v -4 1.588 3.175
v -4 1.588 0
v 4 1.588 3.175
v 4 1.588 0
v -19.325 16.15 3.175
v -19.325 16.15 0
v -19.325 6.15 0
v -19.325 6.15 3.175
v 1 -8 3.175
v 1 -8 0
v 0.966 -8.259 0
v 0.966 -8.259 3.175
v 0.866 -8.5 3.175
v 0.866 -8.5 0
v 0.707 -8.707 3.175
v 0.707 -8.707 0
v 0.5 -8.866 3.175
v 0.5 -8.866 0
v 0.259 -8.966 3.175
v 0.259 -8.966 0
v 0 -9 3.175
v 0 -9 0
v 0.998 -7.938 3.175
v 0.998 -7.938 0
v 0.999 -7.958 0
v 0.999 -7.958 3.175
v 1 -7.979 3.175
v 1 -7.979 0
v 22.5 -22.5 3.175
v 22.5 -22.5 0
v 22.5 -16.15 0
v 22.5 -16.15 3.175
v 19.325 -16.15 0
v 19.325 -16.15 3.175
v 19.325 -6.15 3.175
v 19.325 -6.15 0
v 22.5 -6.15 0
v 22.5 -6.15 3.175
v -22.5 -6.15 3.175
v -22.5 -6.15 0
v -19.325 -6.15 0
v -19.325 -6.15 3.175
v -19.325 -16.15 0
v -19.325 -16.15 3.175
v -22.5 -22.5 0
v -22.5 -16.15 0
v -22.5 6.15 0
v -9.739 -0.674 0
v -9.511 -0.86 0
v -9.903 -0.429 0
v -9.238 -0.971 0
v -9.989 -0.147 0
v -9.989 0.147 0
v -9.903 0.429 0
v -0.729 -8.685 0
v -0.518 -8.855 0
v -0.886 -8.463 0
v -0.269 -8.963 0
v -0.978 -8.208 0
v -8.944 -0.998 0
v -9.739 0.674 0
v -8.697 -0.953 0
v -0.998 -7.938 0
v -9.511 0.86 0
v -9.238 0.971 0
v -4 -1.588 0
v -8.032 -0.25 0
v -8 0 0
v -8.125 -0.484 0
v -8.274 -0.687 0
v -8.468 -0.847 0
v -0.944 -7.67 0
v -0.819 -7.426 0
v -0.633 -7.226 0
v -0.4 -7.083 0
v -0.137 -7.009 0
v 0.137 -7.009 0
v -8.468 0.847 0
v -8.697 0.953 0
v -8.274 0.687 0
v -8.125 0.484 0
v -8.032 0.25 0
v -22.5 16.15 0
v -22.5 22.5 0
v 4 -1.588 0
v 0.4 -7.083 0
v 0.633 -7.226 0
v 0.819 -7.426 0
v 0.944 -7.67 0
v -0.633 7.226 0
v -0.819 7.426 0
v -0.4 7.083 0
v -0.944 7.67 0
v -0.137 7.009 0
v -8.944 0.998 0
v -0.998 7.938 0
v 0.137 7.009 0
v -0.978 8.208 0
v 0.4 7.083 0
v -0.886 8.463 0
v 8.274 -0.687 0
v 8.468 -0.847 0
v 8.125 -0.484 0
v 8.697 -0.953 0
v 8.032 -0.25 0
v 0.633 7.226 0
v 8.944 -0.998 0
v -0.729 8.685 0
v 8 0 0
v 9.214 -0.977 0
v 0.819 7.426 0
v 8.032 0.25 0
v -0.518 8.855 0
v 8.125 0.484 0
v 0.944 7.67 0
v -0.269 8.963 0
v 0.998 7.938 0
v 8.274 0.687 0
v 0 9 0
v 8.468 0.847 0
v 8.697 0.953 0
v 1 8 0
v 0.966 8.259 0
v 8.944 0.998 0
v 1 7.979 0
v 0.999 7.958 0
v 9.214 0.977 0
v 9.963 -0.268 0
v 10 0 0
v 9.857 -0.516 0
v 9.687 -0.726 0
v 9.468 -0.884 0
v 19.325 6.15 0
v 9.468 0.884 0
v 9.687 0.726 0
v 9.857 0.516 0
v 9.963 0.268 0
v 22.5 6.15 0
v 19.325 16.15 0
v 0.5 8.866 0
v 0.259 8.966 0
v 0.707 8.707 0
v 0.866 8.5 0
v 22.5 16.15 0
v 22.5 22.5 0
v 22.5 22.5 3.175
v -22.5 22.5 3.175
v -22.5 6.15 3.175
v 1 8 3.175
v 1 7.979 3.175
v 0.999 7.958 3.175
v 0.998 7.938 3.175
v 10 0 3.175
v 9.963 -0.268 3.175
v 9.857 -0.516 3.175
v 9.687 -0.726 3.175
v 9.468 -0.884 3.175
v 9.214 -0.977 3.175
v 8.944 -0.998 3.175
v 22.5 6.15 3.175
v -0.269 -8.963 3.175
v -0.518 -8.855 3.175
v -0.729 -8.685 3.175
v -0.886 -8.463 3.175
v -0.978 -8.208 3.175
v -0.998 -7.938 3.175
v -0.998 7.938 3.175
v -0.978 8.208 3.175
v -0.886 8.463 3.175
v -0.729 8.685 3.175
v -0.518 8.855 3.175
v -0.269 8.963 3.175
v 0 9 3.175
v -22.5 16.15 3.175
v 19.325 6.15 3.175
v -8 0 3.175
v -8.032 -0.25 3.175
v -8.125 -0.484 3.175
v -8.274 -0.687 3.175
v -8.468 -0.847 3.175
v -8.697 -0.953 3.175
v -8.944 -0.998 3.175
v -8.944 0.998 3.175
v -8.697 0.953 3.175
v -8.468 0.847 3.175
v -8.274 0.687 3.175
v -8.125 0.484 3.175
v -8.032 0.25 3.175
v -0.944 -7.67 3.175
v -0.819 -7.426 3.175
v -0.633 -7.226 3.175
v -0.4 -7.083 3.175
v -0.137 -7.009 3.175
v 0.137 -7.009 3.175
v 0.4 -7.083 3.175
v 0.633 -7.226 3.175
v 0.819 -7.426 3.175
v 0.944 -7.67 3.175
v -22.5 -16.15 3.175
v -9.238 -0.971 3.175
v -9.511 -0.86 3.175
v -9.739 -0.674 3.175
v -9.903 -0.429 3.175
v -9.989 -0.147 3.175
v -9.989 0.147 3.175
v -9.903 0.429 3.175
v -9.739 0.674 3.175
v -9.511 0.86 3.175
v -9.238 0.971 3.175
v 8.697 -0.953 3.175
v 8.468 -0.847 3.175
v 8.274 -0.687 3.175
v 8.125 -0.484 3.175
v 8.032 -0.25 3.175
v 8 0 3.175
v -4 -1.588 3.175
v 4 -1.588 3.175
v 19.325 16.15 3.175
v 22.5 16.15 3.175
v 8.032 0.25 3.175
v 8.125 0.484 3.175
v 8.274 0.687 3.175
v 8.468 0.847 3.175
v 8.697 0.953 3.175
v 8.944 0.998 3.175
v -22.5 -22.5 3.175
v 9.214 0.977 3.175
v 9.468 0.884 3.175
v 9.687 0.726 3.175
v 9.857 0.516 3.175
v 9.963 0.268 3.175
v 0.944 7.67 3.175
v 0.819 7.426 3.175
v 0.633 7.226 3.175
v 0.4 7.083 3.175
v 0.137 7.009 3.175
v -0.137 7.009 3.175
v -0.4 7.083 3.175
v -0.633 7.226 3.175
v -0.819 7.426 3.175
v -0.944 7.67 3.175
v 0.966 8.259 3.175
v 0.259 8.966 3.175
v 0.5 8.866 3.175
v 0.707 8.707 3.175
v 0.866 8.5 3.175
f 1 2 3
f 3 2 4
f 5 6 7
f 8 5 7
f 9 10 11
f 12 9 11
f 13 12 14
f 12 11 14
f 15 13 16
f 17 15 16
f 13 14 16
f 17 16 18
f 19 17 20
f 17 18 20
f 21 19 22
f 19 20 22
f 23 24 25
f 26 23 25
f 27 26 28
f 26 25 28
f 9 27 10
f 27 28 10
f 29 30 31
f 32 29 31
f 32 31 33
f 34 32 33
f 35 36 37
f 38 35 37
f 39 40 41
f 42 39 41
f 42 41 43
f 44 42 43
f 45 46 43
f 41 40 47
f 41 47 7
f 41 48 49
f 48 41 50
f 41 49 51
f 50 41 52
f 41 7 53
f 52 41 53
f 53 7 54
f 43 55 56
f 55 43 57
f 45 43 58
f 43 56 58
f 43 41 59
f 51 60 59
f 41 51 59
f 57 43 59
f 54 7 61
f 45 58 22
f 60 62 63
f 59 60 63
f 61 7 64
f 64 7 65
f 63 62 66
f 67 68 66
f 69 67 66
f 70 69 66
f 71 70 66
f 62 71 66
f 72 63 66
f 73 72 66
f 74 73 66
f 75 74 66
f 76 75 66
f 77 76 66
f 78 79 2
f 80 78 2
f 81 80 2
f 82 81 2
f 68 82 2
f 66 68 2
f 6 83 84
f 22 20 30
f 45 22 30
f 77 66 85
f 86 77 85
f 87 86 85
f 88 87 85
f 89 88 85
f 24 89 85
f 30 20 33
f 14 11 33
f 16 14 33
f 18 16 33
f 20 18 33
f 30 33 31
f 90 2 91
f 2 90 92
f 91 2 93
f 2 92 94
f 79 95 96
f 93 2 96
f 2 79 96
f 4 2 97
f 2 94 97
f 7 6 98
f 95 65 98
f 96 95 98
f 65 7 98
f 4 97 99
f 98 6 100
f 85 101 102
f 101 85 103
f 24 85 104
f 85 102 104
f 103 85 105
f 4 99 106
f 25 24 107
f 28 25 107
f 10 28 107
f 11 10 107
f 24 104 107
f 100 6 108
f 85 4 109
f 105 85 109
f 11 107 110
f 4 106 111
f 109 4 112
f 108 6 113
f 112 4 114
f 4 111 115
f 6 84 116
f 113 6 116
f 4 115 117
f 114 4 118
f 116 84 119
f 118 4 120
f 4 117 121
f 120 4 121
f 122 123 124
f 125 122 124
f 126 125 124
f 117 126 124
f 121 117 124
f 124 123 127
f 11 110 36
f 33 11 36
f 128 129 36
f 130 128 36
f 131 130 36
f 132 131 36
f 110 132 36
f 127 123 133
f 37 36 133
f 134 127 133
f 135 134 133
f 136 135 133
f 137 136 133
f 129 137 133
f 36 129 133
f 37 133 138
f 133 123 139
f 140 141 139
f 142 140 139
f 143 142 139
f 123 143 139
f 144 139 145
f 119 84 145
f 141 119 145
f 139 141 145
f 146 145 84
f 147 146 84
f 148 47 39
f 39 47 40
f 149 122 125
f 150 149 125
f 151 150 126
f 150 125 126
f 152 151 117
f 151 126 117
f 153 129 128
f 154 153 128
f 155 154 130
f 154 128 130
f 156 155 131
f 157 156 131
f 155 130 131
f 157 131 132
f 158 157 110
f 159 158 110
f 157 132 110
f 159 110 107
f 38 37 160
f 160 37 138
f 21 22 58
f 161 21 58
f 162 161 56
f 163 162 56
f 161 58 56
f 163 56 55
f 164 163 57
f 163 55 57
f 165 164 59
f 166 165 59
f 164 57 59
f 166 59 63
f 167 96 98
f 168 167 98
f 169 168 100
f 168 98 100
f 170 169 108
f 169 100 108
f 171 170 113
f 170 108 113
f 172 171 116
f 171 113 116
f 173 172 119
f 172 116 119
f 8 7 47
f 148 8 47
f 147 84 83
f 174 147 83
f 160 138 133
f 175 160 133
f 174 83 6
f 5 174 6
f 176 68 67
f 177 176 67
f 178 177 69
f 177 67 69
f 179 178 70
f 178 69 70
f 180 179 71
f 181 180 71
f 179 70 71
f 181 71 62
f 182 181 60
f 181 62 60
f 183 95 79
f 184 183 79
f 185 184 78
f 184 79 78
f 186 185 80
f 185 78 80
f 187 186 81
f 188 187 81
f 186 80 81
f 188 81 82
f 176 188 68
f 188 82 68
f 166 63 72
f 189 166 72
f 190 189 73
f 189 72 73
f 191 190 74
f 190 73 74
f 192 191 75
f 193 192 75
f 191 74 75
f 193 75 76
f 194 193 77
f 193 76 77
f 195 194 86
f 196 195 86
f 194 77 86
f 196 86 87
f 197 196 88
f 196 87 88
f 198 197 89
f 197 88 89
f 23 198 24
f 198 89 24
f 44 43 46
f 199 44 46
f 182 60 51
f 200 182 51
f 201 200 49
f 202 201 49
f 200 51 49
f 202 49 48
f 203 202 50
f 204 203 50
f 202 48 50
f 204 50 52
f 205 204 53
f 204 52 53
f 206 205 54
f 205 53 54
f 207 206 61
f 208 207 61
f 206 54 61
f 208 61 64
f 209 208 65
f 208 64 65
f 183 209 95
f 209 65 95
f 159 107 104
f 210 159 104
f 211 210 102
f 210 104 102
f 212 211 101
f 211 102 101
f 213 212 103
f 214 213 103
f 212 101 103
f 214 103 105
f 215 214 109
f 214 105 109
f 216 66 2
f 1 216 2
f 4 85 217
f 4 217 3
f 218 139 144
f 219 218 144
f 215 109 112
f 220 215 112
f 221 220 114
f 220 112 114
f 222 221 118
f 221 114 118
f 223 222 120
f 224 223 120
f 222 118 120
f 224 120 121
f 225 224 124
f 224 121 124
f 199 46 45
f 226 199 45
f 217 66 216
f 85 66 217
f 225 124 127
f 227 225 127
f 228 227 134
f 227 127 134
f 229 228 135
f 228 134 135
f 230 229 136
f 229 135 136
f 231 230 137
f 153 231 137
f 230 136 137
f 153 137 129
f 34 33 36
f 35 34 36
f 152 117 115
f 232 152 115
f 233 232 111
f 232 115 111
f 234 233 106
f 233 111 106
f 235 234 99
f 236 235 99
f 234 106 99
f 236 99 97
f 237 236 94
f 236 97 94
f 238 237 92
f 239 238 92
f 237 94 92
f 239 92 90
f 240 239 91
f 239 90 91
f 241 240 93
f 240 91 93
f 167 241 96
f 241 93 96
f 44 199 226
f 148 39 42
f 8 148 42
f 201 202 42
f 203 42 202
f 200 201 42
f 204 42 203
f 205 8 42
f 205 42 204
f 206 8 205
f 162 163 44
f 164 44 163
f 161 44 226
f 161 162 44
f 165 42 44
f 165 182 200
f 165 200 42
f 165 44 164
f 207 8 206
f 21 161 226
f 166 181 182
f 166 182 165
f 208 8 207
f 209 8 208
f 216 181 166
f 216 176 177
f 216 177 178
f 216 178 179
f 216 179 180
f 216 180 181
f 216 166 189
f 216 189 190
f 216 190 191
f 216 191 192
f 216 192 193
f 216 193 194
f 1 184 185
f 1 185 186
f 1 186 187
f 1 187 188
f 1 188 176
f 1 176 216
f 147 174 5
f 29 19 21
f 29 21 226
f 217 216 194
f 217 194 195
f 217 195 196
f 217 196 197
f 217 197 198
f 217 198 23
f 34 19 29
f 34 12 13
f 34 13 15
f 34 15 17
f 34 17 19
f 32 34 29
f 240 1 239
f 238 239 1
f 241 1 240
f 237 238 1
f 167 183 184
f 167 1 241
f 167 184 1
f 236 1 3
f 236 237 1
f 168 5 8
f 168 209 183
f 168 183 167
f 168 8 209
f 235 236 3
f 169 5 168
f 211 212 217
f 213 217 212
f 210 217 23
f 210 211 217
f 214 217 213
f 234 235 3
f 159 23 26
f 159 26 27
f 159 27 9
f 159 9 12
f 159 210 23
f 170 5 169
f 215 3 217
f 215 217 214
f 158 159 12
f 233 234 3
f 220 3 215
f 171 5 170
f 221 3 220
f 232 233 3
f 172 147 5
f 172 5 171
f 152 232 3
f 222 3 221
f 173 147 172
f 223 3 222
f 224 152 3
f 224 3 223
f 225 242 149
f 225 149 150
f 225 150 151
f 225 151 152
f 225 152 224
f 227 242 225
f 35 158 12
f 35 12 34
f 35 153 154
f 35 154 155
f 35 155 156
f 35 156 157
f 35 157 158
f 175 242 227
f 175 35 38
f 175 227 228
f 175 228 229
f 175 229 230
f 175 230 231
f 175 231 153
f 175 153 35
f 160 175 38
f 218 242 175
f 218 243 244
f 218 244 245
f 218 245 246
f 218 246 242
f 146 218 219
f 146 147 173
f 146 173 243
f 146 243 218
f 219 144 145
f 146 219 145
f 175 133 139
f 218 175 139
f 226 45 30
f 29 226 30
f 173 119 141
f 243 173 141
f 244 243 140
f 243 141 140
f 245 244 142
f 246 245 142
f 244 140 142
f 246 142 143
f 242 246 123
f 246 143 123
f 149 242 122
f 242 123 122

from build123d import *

# Parameters (mm, degrees)
F0_W     = 8
F0_H     = 3.175
F1_DEPTH = 3.175


# Not quite as in the source:
# - a length typed as a fraction of an inch, garbled in the dataset ("3 / 203.2 mm" for 3/8 in), is restored
# - a feature names something its author has since deleted; it is built from what else it names


with BuildPart() as f1:
    # F0 (on Top) → F1 (new body)
    with BuildSketch(Plane.XY):
        Polygon((-19.325, 11.15), (19.325, 11.15), (19.325, 16.15), (22.5, 16.15), (22.5, 22.5), (-22.5, 22.5), (-22.5, 16.15), (-19.325, 16.15), align=None)
        Polygon((-19.325, -11.15), (19.325, -11.15), (19.325, -6.15), (22.5, -6.15), (22.5, 6.15), (19.325, 6.15), (19.325, 11.15), (-19.325, 11.15), (-19.325, 6.15), (-22.5, 6.15), (-22.5, -6.15), (-19.325, -6.15), align=None)
        with BuildLine():
            ThreePointArc((-8.9444444444, -0.9984555975), (-10, 0), (-8.9444444444, 0.9984555975))
            ThreePointArc((-8.9444444444, 0.9984555975), (-6.000579123, 6.7076859042), (0, 9))
            ThreePointArc((0, 9), (6.000579123, 6.7076859042), (8.9444444444, 0.9984555975))
            ThreePointArc((8.9444444444, 0.9984555975), (9.6871842709, 0.7264831573), (10, 0))
            ThreePointArc((10, 0), (9.6871842709, -0.7264831573), (8.9444444444, -0.9984555975))
            ThreePointArc((8.9444444444, -0.9984555975), (6.000579123, -6.7076859042), (0, -9))
            ThreePointArc((0, -9), (-6.000579123, -6.7076859042), (-8.9444444444, -0.9984555975))
        make_face(mode=Mode.SUBTRACT)
        Polygon((-22.5, -22.5), (22.5, -22.5), (22.5, -16.15), (19.325, -16.15), (19.325, -11.15), (-19.325, -11.15), (-19.325, -16.15), (-22.5, -16.15), align=None)
        with BuildLine():
            ThreePointArc((-0.9980449639, 7.9375), (-5.9993482859, 5.2922415047), (-8, 0))
            ThreePointArc((-8, 0), (-5.9993482859, -5.2922415047), (-0.9980449639, -7.9375))
            ThreePointArc((-0.9980449639, -7.9375), (0, -7), (0.9980449639, -7.9375))
            ThreePointArc((0.9980449639, -7.9375), (5.9993482859, -5.2922415047), (8, 0))
            ThreePointArc((8, 0), (5.9993482859, 5.2922415047), (0.9980449639, 7.9375))
            ThreePointArc((0.9980449639, 7.9375), (0, 7), (-0.9980449639, 7.9375))
        make_face()
        Rectangle(F0_W, F0_H, mode=Mode.SUBTRACT)
        with BuildLine():
            ThreePointArc((-8.9444444444, 0.9984555975), (-8.2735168427, 0.6871842709), (-8, 0))
            ThreePointArc((-8, 0), (-5.9993482859, 5.2922415047), (-0.9980449639, 7.9375))
            ThreePointArc((-0.9980449639, 7.9375), (-0.7288689869, 8.6846531969), (0, 9))
            ThreePointArc((0, 9), (-6.000579123, 6.7076859042), (-8.9444444444, 0.9984555975))
        make_face()
        with BuildLine():
            ThreePointArc((8.9444444444, 0.9984555975), (6.000579123, 6.7076859042), (0, 9))
            ThreePointArc((0, 9), (0.7071067812, 8.7071067812), (1, 8))
            ThreePointArc((1, 8), (0.9995111215, 7.9687347151), (0.9980449639, 7.9375))
            ThreePointArc((0.9980449639, 7.9375), (5.9993482859, 5.2922415047), (8, 0))
            ThreePointArc((8, 0), (8.2735168427, 0.6871842709), (8.9444444444, 0.9984555975))
        make_face()
        with BuildLine():
            ThreePointArc((1, -8), (0.7071067812, -8.7071067812), (0, -9))
            ThreePointArc((0, -9), (6.000579123, -6.7076859042), (8.9444444444, -0.9984555975))
            ThreePointArc((8.9444444444, -0.9984555975), (8.2735168427, -0.6871842709), (8, 0))
            ThreePointArc((8, 0), (5.9993482859, -5.2922415047), (0.9980449639, -7.9375))
            ThreePointArc((0.9980449639, -7.9375), (0.9995111215, -7.9687347151), (1, -8))
        make_face()
        with BuildLine():
            ThreePointArc((-0.9980449639, -7.9375), (-5.9993482859, -5.2922415047), (-8, 0))
            ThreePointArc((-8, 0), (-8.2735168427, -0.6871842709), (-8.9444444444, -0.9984555975))
            ThreePointArc((-8.9444444444, -0.9984555975), (-6.000579123, -6.7076859042), (0, -9))
            ThreePointArc((0, -9), (-0.7288689869, -8.6846531969), (-0.9980449639, -7.9375))
        make_face()
    extrude(amount=F1_DEPTH)


solid = f1.part
